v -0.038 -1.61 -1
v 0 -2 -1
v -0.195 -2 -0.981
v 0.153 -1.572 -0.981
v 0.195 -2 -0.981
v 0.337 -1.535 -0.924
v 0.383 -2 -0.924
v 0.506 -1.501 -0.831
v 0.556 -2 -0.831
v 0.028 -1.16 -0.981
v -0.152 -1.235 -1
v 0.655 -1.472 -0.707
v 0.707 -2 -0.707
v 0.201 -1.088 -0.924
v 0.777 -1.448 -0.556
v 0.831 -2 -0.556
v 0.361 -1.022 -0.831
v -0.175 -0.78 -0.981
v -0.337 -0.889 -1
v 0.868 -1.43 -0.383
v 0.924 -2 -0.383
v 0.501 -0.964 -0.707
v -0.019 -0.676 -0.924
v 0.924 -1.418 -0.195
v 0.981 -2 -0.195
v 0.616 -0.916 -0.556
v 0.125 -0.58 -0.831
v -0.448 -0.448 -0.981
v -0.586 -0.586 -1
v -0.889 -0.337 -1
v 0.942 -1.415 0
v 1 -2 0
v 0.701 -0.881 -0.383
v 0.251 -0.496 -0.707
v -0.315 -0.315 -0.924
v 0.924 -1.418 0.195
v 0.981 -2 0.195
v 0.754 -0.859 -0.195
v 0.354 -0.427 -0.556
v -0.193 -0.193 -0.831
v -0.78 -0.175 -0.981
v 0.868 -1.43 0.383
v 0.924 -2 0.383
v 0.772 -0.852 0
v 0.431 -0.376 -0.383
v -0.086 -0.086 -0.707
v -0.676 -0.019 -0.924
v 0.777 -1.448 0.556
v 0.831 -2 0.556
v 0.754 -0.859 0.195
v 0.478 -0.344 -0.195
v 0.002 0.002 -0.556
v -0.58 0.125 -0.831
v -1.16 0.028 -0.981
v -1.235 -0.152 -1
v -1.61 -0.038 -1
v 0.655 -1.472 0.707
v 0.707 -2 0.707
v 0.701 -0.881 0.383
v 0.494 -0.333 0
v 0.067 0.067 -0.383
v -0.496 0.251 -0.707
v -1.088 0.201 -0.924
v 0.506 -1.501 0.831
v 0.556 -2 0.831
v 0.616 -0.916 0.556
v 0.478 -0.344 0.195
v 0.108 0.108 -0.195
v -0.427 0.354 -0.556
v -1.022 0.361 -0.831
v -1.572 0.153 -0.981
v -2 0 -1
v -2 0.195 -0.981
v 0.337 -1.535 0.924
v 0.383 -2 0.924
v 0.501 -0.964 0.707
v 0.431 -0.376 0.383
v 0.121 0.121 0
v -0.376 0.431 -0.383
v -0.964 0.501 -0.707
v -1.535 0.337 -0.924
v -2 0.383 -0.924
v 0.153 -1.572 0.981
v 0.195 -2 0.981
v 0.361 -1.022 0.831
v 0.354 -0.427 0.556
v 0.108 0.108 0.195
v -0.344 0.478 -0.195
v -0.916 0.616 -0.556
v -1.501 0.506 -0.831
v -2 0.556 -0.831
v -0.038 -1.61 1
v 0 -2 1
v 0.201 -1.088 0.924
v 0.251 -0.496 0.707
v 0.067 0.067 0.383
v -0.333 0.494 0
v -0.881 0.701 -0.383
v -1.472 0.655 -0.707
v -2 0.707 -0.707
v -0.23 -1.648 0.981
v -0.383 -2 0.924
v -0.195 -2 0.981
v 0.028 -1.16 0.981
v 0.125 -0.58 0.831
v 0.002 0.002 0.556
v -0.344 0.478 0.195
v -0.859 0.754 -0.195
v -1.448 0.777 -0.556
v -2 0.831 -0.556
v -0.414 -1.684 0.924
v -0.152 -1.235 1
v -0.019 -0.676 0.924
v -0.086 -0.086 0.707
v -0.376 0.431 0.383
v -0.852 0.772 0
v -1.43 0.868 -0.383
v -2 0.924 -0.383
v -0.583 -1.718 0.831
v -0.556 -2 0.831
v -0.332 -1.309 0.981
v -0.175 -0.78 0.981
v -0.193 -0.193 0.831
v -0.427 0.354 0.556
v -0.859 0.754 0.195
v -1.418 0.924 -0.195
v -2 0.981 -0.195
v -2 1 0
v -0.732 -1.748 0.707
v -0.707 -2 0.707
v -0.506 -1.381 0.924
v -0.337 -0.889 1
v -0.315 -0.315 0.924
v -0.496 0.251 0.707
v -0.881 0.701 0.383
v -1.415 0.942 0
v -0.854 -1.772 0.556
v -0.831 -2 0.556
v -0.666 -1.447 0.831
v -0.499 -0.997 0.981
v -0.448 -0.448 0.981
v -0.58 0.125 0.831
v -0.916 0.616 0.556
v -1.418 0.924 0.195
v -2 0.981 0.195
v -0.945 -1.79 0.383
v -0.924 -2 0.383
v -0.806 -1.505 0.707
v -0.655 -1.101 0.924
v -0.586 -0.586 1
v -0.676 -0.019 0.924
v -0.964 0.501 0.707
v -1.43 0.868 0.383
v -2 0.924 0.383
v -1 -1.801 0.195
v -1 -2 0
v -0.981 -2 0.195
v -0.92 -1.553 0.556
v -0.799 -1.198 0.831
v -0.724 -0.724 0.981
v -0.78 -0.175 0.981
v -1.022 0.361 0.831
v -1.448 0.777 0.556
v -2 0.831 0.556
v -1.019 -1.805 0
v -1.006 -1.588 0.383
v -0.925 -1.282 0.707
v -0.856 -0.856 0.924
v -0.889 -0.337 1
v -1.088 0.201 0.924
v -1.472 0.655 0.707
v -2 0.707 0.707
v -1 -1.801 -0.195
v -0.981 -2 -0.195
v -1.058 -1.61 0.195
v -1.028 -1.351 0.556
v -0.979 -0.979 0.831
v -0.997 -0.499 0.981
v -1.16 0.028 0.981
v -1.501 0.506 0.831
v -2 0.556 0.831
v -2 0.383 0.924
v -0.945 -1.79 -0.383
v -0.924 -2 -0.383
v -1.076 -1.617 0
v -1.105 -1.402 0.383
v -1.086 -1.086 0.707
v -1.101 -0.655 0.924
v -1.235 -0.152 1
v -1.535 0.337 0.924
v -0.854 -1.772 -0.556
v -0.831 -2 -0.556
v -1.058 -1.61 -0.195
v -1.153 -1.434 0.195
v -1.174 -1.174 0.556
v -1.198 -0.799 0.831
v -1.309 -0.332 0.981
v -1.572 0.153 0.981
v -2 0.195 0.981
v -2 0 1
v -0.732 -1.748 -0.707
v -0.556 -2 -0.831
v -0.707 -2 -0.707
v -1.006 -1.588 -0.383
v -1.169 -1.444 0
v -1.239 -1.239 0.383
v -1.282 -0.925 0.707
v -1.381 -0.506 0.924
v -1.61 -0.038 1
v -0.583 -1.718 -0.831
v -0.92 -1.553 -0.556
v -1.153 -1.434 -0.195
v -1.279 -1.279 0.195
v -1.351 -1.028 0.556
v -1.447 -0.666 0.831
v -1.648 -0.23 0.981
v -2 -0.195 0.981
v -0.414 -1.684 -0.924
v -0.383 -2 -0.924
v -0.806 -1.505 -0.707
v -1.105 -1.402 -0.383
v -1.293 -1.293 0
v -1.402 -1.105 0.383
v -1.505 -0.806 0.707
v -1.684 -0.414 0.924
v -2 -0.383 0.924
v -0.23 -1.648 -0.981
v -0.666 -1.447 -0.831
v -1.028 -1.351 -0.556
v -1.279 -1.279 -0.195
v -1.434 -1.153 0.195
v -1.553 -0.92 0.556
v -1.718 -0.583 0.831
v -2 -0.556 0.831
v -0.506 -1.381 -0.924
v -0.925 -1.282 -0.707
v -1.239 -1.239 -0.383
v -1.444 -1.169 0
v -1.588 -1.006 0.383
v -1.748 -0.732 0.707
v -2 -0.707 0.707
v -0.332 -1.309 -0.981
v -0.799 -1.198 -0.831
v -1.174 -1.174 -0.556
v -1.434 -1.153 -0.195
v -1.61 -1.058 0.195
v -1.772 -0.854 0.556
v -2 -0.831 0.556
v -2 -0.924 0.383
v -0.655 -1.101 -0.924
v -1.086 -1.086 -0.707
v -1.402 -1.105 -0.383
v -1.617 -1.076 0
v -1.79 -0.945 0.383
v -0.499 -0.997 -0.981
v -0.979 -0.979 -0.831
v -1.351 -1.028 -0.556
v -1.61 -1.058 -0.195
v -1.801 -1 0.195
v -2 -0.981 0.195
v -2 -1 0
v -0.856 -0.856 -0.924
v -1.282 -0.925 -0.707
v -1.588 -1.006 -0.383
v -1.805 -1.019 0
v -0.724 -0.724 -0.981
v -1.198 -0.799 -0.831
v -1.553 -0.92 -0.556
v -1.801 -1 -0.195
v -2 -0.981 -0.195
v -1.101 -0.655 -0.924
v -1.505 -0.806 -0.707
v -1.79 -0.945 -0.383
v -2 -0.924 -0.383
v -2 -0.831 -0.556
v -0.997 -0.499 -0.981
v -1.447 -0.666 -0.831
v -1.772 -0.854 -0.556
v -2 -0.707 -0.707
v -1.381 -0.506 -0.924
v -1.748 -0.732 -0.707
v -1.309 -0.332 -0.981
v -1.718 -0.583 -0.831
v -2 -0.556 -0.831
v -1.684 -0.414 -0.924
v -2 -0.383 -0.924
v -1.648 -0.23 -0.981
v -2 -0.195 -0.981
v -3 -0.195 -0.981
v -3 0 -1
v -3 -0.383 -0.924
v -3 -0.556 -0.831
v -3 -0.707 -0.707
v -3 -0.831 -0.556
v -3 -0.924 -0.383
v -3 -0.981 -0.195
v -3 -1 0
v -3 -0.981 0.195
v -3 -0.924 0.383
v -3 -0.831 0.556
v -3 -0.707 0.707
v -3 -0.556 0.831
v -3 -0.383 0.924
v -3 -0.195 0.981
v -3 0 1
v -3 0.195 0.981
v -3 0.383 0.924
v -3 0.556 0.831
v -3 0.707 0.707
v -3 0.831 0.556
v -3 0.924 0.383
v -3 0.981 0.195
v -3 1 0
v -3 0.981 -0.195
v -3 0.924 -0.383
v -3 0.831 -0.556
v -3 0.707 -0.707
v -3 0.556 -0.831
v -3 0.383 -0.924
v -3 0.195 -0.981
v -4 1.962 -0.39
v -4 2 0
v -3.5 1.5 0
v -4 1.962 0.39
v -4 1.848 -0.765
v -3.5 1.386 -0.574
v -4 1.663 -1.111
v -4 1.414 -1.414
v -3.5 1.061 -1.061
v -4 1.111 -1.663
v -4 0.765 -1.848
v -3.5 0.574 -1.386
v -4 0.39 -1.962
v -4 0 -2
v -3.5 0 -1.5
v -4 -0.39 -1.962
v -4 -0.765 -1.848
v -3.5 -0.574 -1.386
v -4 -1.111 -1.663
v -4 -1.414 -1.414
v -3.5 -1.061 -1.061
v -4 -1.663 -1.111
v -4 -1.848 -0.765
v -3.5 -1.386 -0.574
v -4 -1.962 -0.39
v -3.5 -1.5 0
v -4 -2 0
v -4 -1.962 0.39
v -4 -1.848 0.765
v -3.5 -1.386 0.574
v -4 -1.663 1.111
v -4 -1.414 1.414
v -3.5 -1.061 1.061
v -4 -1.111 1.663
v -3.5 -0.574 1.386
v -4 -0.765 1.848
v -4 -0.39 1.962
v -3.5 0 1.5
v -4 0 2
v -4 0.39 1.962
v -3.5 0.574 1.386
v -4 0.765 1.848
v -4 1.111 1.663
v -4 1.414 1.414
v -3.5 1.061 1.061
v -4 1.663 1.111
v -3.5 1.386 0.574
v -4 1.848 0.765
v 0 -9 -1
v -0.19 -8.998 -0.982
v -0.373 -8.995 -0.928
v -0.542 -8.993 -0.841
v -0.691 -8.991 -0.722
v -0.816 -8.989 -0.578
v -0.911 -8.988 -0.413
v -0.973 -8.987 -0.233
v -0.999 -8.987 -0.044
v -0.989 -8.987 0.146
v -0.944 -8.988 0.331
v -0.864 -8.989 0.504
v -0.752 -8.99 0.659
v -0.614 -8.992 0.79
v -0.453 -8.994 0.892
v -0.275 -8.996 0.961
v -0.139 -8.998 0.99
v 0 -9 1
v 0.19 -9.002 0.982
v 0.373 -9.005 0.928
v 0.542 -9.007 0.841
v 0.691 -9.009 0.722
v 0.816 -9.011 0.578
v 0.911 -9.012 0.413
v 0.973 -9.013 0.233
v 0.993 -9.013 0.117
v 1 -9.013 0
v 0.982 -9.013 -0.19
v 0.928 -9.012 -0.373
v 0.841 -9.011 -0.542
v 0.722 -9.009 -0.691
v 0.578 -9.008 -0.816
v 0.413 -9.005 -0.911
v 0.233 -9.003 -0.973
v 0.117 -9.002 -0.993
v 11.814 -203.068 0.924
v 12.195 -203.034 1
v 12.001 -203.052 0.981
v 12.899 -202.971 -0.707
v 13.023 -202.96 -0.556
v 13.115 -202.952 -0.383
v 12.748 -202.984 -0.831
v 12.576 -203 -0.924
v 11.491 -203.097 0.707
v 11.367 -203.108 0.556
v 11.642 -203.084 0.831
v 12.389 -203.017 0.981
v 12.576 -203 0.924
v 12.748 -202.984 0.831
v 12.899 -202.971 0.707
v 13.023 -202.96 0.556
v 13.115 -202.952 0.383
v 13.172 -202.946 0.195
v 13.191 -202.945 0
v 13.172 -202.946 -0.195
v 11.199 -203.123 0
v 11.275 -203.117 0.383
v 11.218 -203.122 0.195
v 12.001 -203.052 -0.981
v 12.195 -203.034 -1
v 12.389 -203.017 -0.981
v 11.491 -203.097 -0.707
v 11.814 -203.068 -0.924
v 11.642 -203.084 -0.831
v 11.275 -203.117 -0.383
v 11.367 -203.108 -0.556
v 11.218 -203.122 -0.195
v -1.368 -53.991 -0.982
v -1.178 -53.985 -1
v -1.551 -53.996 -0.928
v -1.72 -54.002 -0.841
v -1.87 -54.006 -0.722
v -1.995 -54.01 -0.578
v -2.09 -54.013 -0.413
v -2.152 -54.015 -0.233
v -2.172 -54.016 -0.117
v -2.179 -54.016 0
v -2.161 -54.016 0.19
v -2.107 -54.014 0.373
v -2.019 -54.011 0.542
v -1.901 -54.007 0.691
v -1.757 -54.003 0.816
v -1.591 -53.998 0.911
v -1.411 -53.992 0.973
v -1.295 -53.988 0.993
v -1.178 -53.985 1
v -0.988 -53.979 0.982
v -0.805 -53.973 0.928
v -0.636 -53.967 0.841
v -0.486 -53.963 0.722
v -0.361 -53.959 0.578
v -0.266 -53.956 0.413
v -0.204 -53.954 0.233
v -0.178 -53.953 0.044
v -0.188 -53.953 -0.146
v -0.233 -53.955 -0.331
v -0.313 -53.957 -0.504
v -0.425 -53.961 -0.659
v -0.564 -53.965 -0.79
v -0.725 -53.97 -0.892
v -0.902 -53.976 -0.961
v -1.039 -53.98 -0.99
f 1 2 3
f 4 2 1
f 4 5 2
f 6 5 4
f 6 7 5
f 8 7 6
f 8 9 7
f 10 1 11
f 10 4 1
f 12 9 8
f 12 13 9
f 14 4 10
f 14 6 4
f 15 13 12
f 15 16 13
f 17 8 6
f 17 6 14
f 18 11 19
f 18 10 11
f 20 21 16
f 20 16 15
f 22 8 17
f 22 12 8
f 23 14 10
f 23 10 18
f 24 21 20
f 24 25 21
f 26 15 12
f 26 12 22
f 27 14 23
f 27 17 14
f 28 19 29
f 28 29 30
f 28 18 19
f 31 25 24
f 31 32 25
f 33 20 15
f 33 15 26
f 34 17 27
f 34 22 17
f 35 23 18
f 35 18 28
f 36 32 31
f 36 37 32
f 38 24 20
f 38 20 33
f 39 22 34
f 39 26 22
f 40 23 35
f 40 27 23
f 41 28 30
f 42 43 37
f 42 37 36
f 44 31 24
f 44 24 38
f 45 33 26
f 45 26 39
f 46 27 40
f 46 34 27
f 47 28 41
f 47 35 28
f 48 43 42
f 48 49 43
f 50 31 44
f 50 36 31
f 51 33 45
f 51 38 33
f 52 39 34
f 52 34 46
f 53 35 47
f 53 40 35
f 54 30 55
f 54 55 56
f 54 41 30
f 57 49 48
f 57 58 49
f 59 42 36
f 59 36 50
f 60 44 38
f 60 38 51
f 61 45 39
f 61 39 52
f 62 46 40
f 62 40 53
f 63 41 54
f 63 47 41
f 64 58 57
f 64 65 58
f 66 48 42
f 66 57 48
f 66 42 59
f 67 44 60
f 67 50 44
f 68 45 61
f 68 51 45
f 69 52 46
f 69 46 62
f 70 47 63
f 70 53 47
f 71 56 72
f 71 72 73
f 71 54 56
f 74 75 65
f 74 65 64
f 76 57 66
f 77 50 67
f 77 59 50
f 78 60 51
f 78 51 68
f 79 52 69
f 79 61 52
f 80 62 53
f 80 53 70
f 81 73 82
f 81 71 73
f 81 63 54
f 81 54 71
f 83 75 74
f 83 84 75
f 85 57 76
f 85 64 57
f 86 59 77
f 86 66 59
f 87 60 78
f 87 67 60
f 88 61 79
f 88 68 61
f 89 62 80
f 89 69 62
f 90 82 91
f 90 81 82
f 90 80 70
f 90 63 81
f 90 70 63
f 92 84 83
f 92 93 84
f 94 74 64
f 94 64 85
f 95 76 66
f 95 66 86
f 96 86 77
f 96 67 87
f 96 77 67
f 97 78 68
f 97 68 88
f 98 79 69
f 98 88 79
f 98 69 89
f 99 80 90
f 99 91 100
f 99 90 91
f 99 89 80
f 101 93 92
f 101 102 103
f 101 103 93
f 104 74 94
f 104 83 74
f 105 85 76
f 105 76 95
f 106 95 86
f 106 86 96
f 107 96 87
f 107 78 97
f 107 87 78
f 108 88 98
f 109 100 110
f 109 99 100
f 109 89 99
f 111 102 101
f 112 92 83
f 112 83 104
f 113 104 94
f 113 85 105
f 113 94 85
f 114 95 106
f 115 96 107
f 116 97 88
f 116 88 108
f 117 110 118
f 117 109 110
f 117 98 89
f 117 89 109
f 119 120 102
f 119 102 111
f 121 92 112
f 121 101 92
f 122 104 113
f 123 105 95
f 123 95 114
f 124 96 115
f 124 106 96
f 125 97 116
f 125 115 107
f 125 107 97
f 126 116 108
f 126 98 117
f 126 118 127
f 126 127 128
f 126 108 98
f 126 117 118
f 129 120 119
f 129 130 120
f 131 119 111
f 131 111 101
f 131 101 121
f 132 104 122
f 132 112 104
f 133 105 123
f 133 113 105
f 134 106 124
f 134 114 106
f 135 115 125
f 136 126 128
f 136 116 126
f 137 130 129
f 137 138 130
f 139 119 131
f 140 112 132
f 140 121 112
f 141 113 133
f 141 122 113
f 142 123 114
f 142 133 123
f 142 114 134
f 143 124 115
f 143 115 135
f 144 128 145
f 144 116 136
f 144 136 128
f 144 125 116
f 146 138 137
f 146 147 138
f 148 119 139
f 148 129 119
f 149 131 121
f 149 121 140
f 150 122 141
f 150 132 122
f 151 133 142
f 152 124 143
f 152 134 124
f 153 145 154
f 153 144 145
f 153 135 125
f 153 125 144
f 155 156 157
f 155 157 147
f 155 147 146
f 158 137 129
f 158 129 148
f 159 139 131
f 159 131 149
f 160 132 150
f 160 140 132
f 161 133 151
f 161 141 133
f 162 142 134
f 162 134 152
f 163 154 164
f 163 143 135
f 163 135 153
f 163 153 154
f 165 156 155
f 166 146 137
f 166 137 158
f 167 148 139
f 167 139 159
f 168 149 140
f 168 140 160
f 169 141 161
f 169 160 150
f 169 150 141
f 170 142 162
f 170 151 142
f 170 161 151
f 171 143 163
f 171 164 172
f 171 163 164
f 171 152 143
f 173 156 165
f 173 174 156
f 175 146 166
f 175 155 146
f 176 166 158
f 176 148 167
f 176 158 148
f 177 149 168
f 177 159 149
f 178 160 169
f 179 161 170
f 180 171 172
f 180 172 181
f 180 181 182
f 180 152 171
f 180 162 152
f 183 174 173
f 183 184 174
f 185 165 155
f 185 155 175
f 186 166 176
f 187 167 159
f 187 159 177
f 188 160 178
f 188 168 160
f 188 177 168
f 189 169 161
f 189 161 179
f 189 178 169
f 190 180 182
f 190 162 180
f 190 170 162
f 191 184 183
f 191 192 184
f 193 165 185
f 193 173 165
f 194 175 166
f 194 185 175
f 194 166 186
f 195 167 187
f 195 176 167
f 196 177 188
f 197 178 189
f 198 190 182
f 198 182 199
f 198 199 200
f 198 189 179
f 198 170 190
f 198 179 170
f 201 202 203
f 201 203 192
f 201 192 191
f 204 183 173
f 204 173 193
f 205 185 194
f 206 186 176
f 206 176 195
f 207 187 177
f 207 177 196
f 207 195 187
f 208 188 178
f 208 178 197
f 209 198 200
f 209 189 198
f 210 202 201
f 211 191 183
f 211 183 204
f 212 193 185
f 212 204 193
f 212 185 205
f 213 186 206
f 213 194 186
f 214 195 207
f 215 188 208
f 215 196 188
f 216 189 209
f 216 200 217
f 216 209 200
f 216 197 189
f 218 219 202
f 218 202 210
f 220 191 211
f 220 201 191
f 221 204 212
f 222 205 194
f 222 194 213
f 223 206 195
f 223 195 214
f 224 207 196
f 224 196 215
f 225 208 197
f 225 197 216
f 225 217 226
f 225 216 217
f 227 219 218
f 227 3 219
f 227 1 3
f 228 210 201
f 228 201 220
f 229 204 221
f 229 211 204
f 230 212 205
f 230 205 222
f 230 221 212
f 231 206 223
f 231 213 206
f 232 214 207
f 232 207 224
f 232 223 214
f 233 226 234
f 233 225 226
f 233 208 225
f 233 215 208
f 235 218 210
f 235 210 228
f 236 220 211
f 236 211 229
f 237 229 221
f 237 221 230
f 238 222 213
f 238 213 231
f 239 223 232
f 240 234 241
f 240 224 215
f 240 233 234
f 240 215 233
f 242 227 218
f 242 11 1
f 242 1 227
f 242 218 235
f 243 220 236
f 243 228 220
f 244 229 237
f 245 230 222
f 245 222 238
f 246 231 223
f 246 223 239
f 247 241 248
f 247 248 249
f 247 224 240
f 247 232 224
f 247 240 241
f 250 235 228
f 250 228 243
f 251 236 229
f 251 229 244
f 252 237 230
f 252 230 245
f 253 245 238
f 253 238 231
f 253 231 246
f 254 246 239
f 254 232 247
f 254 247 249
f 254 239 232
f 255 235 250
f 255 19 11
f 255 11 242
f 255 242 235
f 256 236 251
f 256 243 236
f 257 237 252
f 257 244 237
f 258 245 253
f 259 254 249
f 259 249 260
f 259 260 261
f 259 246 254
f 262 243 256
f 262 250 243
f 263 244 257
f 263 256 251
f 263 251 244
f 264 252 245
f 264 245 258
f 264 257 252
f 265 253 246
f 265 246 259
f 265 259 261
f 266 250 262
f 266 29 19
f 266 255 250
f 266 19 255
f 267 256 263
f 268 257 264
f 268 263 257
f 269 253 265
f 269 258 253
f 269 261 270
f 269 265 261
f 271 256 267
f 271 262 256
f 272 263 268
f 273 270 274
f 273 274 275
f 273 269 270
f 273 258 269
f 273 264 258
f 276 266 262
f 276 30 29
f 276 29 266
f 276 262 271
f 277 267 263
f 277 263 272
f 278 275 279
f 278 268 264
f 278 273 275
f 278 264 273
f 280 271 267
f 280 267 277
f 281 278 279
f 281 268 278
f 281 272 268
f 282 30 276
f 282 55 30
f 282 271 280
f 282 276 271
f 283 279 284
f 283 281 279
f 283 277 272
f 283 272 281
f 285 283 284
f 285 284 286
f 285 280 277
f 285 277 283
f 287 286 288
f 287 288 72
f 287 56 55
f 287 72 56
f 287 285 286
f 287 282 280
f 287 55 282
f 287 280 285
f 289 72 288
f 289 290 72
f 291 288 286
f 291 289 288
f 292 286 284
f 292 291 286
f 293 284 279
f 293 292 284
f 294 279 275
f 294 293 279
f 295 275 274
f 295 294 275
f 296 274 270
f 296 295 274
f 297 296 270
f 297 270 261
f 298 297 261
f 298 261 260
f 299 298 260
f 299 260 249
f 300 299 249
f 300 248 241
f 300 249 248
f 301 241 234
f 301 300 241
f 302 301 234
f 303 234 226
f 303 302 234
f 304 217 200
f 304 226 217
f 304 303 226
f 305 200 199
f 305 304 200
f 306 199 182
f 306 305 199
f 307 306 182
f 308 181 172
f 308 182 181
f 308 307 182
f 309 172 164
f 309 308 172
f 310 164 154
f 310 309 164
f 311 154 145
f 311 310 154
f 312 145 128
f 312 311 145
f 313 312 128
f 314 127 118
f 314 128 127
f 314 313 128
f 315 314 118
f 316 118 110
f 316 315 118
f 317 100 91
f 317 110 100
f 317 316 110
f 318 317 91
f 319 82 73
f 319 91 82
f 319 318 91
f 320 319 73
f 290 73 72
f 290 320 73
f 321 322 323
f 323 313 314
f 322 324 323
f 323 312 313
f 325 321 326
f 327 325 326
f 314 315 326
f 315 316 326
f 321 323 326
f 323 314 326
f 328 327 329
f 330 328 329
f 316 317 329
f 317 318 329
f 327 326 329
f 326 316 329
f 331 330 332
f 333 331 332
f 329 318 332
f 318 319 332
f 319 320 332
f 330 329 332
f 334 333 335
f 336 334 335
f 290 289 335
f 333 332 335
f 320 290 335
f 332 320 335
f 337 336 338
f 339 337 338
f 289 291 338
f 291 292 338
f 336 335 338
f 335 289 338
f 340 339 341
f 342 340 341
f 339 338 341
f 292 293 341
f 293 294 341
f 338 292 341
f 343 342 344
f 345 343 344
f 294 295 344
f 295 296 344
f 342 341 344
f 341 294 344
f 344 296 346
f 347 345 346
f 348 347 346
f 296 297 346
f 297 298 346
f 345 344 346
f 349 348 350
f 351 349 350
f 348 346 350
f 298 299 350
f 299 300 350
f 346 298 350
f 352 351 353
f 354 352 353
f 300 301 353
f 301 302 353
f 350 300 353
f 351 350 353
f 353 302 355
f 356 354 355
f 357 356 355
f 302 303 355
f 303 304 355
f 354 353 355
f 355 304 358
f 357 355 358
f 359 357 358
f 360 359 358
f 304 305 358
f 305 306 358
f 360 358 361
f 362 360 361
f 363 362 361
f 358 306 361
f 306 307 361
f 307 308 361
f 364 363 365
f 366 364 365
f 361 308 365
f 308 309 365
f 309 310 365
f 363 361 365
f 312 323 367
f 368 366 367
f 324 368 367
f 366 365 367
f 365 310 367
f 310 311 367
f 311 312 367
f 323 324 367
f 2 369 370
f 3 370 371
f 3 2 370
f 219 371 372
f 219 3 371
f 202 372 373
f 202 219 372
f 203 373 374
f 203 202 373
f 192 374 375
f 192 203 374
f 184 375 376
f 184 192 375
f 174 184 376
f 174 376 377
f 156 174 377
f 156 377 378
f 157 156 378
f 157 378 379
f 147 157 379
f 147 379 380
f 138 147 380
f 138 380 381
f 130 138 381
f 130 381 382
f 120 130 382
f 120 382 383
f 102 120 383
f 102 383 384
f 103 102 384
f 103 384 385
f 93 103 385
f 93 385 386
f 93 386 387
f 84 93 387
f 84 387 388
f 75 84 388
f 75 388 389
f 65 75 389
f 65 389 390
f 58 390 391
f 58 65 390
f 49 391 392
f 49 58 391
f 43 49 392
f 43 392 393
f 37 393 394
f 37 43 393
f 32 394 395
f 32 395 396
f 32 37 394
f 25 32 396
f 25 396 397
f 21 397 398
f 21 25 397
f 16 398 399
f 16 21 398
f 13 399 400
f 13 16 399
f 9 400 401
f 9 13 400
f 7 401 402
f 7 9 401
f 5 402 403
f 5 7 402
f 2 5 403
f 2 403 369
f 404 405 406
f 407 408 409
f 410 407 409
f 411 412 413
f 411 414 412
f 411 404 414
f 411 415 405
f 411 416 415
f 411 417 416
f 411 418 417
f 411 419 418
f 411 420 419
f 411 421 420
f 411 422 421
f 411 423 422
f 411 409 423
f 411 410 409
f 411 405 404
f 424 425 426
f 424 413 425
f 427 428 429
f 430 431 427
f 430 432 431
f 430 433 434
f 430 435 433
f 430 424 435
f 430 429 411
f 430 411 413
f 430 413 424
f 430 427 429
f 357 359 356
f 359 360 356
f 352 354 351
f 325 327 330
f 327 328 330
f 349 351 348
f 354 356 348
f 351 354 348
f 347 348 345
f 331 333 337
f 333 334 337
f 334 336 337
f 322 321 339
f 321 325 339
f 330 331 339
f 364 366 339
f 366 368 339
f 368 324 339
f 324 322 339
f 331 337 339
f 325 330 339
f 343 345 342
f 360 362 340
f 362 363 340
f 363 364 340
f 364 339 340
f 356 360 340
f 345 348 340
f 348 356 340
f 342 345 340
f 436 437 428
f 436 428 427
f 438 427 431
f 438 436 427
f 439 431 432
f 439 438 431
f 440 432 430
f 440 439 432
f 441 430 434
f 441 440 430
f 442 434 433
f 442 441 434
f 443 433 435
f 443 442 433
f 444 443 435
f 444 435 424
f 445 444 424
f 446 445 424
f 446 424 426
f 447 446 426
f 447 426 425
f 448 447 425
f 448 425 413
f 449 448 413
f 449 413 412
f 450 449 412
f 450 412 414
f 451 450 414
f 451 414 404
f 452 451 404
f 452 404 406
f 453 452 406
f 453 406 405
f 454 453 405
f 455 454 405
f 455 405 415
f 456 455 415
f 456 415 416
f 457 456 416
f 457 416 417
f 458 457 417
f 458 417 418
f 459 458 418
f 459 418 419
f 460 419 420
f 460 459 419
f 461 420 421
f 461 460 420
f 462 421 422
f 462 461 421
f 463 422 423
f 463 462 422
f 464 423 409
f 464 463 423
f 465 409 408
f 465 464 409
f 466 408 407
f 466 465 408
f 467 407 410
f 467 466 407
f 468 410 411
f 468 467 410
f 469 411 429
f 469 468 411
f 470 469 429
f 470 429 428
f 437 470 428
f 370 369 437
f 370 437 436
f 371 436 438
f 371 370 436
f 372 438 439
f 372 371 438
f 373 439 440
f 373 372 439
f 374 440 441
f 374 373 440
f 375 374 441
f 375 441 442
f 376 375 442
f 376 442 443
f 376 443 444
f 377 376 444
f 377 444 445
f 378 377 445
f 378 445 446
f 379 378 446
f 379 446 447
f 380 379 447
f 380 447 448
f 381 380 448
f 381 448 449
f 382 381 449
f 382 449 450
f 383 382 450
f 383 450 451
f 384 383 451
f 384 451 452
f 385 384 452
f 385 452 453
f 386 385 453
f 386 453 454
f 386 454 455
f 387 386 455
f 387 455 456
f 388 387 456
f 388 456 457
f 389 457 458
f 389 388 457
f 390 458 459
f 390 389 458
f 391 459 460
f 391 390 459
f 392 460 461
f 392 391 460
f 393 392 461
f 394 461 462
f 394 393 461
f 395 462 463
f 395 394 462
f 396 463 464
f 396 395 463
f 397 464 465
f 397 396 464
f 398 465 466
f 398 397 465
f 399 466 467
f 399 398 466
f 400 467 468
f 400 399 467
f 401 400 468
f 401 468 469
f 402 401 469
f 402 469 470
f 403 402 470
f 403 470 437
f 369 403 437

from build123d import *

# Parameters (mm, degrees)
ESQUISSE2_R = 1


with BuildPart() as part:
    # Balayage1: sweep along a path in Esquisse1
    with BuildLine(Plane.XY) as balayage1_path:
        Line((12.194958481, -203.034093166), (-1.177962674, -53.984579624))
        Line((-1.177962674, -53.984579624), (0, -9))
        Line((0, -9), (0, -2))
        ThreePointArc((0, -2), (-0.585786438, -0.585786438), (-2, 0))
        Line((-2, 0), (-4, 0))
    # Esquisse2 → Balayage1 (sweep)
    with BuildSketch(Plane(origin=(-4, 0, 0), x_dir=(0, 0, -1), z_dir=(1, 0, 0))):
        Circle(ESQUISSE2_R)
    sweep(path=balayage1_path.line, transition=Transition.RIGHT)

    # Esquisse3 → Révolution1 (revolve)
    with BuildSketch(Plane.XY):
        Polygon((-4, 1), (-4, 2), (-3, 1), align=None)
    revolve(axis=Axis((0, 0, 0), (-1, 0, 0)))


solid = part.part
